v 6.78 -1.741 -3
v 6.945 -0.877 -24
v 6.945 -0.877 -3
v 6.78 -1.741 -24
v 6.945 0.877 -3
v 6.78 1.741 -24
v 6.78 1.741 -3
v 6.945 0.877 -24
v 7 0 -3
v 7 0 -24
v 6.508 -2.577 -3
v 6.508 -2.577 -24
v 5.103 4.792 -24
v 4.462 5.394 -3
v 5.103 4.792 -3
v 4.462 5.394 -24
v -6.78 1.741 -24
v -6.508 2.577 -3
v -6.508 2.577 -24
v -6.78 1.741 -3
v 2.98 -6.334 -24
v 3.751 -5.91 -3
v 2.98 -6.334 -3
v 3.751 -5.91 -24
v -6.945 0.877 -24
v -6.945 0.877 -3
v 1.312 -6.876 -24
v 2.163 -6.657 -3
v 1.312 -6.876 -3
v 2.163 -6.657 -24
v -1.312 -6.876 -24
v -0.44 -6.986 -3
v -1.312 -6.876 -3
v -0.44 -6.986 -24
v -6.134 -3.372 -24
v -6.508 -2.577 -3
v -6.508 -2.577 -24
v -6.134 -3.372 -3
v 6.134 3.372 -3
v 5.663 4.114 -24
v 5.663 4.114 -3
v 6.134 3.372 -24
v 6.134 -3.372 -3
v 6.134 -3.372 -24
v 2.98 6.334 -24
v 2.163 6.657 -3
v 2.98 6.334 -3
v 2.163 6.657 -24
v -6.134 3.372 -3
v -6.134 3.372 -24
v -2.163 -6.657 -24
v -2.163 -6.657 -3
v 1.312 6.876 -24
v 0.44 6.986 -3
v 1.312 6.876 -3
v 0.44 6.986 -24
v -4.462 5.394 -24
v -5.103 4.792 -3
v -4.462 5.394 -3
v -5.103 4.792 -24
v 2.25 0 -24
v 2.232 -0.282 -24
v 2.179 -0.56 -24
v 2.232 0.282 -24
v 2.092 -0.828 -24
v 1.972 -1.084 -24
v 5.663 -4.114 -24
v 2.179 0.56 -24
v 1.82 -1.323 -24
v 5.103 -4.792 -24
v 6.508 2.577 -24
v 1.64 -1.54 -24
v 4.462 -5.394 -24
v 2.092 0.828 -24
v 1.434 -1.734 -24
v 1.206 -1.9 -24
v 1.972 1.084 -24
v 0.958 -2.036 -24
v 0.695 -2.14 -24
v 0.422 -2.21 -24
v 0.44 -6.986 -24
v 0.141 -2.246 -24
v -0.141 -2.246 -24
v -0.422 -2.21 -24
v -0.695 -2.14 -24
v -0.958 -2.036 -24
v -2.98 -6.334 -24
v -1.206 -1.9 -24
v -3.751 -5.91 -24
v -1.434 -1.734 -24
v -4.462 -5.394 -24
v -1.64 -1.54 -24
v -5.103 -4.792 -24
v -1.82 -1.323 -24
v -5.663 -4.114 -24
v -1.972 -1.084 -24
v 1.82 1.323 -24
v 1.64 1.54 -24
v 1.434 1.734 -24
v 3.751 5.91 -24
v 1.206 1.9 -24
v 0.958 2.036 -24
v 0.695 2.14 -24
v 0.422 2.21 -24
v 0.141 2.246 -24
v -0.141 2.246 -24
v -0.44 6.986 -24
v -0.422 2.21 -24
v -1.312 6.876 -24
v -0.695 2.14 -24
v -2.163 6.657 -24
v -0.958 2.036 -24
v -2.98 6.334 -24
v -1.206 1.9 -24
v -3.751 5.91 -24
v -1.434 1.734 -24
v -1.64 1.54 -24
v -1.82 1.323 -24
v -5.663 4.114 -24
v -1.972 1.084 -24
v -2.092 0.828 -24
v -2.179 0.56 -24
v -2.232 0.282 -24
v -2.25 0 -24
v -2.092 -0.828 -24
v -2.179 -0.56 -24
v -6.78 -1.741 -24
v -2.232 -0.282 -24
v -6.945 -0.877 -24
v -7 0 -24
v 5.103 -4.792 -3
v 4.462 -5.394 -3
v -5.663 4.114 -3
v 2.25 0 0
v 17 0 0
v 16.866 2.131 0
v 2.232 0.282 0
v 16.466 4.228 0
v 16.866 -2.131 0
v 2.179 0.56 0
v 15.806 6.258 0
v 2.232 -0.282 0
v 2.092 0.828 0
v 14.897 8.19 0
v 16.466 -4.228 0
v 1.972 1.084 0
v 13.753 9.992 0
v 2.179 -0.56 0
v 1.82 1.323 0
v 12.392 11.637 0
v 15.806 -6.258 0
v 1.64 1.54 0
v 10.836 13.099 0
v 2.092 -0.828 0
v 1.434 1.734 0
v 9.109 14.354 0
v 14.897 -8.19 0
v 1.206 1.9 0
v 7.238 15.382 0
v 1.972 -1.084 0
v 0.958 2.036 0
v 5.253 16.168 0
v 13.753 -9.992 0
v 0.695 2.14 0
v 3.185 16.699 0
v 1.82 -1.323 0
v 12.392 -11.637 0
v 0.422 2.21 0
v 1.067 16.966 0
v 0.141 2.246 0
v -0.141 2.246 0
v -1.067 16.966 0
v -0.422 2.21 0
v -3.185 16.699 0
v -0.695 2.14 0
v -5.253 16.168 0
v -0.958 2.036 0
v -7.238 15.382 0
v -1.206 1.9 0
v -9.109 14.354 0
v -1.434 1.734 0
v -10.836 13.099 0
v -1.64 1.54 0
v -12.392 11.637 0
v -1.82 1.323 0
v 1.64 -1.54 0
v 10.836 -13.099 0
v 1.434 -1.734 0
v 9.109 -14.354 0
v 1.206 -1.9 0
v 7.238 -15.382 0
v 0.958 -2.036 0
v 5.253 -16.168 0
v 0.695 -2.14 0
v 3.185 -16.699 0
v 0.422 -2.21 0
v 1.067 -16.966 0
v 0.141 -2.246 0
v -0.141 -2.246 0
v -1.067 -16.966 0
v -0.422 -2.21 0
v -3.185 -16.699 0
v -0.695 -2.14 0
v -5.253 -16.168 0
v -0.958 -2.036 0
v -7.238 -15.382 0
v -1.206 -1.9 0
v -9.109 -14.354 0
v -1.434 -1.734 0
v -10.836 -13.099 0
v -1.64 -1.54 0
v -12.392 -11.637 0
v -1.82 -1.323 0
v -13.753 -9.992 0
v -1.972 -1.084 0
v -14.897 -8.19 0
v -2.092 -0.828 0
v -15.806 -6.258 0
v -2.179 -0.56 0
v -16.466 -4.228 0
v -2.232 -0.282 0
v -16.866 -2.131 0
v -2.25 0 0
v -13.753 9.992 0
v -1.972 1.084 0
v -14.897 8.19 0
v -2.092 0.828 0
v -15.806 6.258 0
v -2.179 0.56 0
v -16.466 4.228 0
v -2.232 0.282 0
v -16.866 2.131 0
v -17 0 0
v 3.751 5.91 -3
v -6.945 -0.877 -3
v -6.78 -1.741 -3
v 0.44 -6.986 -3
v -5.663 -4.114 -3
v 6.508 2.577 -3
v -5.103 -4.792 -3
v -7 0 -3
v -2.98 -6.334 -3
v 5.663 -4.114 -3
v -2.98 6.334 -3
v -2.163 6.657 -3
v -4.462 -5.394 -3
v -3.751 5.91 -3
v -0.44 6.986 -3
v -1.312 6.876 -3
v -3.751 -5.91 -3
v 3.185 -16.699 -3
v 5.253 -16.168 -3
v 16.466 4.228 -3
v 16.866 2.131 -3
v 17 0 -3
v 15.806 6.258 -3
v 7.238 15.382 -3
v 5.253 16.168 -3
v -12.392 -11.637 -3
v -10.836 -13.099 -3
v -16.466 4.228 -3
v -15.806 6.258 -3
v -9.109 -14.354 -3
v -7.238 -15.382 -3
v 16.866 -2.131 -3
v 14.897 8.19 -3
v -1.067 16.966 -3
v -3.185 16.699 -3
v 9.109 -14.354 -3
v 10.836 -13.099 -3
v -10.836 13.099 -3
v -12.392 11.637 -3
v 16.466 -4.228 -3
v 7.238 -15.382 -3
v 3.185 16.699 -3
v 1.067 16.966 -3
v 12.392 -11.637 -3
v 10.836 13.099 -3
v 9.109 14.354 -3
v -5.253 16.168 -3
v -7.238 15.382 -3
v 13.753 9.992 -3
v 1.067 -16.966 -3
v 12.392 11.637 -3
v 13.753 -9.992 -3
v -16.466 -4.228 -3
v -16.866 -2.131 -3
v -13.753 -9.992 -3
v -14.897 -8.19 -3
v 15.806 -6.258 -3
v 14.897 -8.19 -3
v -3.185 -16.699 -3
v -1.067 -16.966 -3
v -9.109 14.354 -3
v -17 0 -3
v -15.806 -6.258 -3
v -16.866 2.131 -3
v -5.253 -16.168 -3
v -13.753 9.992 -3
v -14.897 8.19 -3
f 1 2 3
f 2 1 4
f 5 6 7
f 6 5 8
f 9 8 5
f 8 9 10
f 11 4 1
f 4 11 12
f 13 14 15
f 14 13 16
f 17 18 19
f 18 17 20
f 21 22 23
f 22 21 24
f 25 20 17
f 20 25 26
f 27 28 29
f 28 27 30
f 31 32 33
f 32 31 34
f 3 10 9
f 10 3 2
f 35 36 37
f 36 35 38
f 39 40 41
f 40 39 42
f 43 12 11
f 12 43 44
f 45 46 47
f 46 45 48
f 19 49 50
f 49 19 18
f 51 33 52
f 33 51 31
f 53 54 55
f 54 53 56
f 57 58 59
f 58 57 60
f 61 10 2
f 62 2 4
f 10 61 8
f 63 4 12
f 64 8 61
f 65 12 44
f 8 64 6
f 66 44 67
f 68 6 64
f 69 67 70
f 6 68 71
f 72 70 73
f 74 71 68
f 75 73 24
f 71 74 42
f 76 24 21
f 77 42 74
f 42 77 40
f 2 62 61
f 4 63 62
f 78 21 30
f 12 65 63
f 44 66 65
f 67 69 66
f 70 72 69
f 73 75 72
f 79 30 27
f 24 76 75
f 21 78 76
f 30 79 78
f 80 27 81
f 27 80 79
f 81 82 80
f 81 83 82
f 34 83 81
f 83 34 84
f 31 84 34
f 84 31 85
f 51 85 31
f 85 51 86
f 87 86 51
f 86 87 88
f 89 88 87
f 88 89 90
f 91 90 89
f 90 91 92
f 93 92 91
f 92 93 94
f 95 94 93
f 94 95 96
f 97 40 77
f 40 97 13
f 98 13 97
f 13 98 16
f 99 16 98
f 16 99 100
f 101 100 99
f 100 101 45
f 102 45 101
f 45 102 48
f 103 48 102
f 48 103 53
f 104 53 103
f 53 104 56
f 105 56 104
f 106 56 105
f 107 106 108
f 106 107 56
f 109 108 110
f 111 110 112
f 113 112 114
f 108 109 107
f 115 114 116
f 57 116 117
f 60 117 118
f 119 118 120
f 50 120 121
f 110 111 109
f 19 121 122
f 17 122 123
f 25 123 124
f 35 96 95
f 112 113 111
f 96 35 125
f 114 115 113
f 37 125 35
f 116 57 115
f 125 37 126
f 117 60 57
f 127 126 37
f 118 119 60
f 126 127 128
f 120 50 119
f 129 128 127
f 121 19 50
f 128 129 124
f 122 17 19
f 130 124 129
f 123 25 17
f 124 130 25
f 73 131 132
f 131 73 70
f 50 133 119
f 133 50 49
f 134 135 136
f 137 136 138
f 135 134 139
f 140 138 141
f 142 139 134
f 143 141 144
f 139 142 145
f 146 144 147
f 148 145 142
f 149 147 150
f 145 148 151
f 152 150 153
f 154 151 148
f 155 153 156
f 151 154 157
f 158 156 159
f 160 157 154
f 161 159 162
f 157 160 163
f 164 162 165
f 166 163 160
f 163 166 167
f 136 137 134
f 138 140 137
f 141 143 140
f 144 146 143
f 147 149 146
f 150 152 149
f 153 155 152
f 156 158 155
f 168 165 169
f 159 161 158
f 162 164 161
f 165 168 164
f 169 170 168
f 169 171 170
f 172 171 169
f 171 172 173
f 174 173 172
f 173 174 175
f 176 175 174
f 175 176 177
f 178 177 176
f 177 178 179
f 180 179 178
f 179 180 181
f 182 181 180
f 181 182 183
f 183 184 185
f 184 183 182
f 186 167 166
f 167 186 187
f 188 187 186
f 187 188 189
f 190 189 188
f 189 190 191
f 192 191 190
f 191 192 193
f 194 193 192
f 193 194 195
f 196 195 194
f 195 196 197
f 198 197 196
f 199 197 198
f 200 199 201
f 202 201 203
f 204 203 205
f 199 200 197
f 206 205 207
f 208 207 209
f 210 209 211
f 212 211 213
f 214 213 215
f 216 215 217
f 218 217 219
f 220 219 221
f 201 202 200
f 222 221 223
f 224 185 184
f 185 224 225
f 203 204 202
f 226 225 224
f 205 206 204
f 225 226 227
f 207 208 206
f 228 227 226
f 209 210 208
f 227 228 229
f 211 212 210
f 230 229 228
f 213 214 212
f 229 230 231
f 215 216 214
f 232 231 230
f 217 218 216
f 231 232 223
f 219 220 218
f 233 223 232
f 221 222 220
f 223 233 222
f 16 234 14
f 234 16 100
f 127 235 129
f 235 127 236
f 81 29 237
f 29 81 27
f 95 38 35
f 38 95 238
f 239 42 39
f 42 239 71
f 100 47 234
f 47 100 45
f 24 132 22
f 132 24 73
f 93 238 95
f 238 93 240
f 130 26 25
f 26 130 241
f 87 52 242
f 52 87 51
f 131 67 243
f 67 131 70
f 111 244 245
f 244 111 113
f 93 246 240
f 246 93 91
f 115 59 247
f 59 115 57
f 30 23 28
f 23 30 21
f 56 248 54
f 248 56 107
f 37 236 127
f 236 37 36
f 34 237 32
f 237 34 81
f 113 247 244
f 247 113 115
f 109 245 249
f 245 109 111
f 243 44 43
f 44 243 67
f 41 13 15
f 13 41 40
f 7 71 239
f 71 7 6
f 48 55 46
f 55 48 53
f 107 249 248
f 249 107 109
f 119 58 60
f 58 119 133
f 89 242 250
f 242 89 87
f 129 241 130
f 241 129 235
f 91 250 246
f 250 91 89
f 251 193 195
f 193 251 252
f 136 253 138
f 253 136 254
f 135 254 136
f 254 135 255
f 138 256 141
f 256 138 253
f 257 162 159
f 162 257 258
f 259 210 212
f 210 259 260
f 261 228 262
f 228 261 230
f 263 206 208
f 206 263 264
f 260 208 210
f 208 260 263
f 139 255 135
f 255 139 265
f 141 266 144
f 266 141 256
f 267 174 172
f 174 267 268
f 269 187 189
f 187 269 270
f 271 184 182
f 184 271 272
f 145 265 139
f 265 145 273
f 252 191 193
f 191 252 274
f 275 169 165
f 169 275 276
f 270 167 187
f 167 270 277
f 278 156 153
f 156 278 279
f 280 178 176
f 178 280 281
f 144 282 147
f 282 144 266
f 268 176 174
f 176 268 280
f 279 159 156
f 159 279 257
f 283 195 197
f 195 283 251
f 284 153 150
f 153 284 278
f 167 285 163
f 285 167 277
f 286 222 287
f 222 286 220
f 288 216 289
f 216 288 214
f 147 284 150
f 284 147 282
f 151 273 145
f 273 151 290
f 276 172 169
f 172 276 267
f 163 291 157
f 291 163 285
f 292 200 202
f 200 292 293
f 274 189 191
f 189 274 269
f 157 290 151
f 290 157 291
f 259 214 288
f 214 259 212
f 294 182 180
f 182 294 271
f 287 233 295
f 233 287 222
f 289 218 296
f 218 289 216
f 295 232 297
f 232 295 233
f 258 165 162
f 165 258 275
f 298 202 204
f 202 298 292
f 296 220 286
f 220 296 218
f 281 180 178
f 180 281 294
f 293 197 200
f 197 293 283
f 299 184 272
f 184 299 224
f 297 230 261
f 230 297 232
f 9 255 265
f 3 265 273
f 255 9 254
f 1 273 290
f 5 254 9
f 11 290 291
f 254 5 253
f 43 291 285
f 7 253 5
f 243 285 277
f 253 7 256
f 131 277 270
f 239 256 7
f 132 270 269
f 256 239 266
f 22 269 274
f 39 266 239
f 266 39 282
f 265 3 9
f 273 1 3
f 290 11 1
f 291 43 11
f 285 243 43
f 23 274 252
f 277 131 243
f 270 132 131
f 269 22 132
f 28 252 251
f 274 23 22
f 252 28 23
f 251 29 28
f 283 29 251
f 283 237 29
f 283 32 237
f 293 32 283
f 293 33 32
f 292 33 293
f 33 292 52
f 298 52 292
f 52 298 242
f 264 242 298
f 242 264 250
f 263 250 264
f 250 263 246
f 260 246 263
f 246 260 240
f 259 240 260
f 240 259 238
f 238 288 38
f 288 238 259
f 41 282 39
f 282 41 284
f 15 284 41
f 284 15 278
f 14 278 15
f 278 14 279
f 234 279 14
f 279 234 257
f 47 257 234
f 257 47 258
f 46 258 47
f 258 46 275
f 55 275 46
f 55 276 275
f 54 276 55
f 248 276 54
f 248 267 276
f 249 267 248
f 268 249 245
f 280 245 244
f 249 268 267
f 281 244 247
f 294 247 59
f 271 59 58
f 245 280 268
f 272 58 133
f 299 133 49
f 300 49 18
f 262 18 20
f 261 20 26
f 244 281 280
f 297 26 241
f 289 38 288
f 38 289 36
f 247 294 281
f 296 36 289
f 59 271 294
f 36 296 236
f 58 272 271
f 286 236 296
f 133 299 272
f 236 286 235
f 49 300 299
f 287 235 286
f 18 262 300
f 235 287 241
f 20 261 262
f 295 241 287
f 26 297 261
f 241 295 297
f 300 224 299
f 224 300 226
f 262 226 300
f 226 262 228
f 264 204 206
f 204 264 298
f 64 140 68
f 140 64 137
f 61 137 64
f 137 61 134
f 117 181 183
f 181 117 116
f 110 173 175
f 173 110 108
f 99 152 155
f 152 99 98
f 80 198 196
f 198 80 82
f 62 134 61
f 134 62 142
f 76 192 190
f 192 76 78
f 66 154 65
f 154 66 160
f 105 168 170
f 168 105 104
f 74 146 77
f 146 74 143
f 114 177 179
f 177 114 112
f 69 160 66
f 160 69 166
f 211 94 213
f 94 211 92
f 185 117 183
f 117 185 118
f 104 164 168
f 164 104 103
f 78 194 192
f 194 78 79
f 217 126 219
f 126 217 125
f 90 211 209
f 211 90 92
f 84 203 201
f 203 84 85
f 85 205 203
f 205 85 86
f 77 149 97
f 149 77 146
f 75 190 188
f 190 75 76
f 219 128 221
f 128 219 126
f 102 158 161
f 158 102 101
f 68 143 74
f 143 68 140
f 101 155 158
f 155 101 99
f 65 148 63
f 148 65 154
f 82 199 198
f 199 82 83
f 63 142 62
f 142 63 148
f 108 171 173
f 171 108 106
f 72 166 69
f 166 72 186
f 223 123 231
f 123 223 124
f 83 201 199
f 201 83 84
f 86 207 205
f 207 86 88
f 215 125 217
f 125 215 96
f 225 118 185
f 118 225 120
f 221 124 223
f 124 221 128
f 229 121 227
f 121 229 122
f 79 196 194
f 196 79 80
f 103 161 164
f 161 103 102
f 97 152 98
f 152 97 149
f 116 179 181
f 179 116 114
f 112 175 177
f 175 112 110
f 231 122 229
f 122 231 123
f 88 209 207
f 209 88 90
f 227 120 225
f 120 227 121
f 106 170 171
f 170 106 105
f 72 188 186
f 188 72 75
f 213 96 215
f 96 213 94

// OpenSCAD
$fn = 50;


difference() {
	union() {
		translate(v = [0, 0, -24.0000000000]) {
			cylinder(h = 24, r = 7.0000000000);
		}
		translate(v = [0, 0, -3.0000000000]) {
			cylinder(h = 3, r = 17.0000000000);
		}
	}
	union() {
		#translate(v = [0, 0, -24]) {
			cylinder(h = 24, r = 2.2500000000);
		}
	}
}
